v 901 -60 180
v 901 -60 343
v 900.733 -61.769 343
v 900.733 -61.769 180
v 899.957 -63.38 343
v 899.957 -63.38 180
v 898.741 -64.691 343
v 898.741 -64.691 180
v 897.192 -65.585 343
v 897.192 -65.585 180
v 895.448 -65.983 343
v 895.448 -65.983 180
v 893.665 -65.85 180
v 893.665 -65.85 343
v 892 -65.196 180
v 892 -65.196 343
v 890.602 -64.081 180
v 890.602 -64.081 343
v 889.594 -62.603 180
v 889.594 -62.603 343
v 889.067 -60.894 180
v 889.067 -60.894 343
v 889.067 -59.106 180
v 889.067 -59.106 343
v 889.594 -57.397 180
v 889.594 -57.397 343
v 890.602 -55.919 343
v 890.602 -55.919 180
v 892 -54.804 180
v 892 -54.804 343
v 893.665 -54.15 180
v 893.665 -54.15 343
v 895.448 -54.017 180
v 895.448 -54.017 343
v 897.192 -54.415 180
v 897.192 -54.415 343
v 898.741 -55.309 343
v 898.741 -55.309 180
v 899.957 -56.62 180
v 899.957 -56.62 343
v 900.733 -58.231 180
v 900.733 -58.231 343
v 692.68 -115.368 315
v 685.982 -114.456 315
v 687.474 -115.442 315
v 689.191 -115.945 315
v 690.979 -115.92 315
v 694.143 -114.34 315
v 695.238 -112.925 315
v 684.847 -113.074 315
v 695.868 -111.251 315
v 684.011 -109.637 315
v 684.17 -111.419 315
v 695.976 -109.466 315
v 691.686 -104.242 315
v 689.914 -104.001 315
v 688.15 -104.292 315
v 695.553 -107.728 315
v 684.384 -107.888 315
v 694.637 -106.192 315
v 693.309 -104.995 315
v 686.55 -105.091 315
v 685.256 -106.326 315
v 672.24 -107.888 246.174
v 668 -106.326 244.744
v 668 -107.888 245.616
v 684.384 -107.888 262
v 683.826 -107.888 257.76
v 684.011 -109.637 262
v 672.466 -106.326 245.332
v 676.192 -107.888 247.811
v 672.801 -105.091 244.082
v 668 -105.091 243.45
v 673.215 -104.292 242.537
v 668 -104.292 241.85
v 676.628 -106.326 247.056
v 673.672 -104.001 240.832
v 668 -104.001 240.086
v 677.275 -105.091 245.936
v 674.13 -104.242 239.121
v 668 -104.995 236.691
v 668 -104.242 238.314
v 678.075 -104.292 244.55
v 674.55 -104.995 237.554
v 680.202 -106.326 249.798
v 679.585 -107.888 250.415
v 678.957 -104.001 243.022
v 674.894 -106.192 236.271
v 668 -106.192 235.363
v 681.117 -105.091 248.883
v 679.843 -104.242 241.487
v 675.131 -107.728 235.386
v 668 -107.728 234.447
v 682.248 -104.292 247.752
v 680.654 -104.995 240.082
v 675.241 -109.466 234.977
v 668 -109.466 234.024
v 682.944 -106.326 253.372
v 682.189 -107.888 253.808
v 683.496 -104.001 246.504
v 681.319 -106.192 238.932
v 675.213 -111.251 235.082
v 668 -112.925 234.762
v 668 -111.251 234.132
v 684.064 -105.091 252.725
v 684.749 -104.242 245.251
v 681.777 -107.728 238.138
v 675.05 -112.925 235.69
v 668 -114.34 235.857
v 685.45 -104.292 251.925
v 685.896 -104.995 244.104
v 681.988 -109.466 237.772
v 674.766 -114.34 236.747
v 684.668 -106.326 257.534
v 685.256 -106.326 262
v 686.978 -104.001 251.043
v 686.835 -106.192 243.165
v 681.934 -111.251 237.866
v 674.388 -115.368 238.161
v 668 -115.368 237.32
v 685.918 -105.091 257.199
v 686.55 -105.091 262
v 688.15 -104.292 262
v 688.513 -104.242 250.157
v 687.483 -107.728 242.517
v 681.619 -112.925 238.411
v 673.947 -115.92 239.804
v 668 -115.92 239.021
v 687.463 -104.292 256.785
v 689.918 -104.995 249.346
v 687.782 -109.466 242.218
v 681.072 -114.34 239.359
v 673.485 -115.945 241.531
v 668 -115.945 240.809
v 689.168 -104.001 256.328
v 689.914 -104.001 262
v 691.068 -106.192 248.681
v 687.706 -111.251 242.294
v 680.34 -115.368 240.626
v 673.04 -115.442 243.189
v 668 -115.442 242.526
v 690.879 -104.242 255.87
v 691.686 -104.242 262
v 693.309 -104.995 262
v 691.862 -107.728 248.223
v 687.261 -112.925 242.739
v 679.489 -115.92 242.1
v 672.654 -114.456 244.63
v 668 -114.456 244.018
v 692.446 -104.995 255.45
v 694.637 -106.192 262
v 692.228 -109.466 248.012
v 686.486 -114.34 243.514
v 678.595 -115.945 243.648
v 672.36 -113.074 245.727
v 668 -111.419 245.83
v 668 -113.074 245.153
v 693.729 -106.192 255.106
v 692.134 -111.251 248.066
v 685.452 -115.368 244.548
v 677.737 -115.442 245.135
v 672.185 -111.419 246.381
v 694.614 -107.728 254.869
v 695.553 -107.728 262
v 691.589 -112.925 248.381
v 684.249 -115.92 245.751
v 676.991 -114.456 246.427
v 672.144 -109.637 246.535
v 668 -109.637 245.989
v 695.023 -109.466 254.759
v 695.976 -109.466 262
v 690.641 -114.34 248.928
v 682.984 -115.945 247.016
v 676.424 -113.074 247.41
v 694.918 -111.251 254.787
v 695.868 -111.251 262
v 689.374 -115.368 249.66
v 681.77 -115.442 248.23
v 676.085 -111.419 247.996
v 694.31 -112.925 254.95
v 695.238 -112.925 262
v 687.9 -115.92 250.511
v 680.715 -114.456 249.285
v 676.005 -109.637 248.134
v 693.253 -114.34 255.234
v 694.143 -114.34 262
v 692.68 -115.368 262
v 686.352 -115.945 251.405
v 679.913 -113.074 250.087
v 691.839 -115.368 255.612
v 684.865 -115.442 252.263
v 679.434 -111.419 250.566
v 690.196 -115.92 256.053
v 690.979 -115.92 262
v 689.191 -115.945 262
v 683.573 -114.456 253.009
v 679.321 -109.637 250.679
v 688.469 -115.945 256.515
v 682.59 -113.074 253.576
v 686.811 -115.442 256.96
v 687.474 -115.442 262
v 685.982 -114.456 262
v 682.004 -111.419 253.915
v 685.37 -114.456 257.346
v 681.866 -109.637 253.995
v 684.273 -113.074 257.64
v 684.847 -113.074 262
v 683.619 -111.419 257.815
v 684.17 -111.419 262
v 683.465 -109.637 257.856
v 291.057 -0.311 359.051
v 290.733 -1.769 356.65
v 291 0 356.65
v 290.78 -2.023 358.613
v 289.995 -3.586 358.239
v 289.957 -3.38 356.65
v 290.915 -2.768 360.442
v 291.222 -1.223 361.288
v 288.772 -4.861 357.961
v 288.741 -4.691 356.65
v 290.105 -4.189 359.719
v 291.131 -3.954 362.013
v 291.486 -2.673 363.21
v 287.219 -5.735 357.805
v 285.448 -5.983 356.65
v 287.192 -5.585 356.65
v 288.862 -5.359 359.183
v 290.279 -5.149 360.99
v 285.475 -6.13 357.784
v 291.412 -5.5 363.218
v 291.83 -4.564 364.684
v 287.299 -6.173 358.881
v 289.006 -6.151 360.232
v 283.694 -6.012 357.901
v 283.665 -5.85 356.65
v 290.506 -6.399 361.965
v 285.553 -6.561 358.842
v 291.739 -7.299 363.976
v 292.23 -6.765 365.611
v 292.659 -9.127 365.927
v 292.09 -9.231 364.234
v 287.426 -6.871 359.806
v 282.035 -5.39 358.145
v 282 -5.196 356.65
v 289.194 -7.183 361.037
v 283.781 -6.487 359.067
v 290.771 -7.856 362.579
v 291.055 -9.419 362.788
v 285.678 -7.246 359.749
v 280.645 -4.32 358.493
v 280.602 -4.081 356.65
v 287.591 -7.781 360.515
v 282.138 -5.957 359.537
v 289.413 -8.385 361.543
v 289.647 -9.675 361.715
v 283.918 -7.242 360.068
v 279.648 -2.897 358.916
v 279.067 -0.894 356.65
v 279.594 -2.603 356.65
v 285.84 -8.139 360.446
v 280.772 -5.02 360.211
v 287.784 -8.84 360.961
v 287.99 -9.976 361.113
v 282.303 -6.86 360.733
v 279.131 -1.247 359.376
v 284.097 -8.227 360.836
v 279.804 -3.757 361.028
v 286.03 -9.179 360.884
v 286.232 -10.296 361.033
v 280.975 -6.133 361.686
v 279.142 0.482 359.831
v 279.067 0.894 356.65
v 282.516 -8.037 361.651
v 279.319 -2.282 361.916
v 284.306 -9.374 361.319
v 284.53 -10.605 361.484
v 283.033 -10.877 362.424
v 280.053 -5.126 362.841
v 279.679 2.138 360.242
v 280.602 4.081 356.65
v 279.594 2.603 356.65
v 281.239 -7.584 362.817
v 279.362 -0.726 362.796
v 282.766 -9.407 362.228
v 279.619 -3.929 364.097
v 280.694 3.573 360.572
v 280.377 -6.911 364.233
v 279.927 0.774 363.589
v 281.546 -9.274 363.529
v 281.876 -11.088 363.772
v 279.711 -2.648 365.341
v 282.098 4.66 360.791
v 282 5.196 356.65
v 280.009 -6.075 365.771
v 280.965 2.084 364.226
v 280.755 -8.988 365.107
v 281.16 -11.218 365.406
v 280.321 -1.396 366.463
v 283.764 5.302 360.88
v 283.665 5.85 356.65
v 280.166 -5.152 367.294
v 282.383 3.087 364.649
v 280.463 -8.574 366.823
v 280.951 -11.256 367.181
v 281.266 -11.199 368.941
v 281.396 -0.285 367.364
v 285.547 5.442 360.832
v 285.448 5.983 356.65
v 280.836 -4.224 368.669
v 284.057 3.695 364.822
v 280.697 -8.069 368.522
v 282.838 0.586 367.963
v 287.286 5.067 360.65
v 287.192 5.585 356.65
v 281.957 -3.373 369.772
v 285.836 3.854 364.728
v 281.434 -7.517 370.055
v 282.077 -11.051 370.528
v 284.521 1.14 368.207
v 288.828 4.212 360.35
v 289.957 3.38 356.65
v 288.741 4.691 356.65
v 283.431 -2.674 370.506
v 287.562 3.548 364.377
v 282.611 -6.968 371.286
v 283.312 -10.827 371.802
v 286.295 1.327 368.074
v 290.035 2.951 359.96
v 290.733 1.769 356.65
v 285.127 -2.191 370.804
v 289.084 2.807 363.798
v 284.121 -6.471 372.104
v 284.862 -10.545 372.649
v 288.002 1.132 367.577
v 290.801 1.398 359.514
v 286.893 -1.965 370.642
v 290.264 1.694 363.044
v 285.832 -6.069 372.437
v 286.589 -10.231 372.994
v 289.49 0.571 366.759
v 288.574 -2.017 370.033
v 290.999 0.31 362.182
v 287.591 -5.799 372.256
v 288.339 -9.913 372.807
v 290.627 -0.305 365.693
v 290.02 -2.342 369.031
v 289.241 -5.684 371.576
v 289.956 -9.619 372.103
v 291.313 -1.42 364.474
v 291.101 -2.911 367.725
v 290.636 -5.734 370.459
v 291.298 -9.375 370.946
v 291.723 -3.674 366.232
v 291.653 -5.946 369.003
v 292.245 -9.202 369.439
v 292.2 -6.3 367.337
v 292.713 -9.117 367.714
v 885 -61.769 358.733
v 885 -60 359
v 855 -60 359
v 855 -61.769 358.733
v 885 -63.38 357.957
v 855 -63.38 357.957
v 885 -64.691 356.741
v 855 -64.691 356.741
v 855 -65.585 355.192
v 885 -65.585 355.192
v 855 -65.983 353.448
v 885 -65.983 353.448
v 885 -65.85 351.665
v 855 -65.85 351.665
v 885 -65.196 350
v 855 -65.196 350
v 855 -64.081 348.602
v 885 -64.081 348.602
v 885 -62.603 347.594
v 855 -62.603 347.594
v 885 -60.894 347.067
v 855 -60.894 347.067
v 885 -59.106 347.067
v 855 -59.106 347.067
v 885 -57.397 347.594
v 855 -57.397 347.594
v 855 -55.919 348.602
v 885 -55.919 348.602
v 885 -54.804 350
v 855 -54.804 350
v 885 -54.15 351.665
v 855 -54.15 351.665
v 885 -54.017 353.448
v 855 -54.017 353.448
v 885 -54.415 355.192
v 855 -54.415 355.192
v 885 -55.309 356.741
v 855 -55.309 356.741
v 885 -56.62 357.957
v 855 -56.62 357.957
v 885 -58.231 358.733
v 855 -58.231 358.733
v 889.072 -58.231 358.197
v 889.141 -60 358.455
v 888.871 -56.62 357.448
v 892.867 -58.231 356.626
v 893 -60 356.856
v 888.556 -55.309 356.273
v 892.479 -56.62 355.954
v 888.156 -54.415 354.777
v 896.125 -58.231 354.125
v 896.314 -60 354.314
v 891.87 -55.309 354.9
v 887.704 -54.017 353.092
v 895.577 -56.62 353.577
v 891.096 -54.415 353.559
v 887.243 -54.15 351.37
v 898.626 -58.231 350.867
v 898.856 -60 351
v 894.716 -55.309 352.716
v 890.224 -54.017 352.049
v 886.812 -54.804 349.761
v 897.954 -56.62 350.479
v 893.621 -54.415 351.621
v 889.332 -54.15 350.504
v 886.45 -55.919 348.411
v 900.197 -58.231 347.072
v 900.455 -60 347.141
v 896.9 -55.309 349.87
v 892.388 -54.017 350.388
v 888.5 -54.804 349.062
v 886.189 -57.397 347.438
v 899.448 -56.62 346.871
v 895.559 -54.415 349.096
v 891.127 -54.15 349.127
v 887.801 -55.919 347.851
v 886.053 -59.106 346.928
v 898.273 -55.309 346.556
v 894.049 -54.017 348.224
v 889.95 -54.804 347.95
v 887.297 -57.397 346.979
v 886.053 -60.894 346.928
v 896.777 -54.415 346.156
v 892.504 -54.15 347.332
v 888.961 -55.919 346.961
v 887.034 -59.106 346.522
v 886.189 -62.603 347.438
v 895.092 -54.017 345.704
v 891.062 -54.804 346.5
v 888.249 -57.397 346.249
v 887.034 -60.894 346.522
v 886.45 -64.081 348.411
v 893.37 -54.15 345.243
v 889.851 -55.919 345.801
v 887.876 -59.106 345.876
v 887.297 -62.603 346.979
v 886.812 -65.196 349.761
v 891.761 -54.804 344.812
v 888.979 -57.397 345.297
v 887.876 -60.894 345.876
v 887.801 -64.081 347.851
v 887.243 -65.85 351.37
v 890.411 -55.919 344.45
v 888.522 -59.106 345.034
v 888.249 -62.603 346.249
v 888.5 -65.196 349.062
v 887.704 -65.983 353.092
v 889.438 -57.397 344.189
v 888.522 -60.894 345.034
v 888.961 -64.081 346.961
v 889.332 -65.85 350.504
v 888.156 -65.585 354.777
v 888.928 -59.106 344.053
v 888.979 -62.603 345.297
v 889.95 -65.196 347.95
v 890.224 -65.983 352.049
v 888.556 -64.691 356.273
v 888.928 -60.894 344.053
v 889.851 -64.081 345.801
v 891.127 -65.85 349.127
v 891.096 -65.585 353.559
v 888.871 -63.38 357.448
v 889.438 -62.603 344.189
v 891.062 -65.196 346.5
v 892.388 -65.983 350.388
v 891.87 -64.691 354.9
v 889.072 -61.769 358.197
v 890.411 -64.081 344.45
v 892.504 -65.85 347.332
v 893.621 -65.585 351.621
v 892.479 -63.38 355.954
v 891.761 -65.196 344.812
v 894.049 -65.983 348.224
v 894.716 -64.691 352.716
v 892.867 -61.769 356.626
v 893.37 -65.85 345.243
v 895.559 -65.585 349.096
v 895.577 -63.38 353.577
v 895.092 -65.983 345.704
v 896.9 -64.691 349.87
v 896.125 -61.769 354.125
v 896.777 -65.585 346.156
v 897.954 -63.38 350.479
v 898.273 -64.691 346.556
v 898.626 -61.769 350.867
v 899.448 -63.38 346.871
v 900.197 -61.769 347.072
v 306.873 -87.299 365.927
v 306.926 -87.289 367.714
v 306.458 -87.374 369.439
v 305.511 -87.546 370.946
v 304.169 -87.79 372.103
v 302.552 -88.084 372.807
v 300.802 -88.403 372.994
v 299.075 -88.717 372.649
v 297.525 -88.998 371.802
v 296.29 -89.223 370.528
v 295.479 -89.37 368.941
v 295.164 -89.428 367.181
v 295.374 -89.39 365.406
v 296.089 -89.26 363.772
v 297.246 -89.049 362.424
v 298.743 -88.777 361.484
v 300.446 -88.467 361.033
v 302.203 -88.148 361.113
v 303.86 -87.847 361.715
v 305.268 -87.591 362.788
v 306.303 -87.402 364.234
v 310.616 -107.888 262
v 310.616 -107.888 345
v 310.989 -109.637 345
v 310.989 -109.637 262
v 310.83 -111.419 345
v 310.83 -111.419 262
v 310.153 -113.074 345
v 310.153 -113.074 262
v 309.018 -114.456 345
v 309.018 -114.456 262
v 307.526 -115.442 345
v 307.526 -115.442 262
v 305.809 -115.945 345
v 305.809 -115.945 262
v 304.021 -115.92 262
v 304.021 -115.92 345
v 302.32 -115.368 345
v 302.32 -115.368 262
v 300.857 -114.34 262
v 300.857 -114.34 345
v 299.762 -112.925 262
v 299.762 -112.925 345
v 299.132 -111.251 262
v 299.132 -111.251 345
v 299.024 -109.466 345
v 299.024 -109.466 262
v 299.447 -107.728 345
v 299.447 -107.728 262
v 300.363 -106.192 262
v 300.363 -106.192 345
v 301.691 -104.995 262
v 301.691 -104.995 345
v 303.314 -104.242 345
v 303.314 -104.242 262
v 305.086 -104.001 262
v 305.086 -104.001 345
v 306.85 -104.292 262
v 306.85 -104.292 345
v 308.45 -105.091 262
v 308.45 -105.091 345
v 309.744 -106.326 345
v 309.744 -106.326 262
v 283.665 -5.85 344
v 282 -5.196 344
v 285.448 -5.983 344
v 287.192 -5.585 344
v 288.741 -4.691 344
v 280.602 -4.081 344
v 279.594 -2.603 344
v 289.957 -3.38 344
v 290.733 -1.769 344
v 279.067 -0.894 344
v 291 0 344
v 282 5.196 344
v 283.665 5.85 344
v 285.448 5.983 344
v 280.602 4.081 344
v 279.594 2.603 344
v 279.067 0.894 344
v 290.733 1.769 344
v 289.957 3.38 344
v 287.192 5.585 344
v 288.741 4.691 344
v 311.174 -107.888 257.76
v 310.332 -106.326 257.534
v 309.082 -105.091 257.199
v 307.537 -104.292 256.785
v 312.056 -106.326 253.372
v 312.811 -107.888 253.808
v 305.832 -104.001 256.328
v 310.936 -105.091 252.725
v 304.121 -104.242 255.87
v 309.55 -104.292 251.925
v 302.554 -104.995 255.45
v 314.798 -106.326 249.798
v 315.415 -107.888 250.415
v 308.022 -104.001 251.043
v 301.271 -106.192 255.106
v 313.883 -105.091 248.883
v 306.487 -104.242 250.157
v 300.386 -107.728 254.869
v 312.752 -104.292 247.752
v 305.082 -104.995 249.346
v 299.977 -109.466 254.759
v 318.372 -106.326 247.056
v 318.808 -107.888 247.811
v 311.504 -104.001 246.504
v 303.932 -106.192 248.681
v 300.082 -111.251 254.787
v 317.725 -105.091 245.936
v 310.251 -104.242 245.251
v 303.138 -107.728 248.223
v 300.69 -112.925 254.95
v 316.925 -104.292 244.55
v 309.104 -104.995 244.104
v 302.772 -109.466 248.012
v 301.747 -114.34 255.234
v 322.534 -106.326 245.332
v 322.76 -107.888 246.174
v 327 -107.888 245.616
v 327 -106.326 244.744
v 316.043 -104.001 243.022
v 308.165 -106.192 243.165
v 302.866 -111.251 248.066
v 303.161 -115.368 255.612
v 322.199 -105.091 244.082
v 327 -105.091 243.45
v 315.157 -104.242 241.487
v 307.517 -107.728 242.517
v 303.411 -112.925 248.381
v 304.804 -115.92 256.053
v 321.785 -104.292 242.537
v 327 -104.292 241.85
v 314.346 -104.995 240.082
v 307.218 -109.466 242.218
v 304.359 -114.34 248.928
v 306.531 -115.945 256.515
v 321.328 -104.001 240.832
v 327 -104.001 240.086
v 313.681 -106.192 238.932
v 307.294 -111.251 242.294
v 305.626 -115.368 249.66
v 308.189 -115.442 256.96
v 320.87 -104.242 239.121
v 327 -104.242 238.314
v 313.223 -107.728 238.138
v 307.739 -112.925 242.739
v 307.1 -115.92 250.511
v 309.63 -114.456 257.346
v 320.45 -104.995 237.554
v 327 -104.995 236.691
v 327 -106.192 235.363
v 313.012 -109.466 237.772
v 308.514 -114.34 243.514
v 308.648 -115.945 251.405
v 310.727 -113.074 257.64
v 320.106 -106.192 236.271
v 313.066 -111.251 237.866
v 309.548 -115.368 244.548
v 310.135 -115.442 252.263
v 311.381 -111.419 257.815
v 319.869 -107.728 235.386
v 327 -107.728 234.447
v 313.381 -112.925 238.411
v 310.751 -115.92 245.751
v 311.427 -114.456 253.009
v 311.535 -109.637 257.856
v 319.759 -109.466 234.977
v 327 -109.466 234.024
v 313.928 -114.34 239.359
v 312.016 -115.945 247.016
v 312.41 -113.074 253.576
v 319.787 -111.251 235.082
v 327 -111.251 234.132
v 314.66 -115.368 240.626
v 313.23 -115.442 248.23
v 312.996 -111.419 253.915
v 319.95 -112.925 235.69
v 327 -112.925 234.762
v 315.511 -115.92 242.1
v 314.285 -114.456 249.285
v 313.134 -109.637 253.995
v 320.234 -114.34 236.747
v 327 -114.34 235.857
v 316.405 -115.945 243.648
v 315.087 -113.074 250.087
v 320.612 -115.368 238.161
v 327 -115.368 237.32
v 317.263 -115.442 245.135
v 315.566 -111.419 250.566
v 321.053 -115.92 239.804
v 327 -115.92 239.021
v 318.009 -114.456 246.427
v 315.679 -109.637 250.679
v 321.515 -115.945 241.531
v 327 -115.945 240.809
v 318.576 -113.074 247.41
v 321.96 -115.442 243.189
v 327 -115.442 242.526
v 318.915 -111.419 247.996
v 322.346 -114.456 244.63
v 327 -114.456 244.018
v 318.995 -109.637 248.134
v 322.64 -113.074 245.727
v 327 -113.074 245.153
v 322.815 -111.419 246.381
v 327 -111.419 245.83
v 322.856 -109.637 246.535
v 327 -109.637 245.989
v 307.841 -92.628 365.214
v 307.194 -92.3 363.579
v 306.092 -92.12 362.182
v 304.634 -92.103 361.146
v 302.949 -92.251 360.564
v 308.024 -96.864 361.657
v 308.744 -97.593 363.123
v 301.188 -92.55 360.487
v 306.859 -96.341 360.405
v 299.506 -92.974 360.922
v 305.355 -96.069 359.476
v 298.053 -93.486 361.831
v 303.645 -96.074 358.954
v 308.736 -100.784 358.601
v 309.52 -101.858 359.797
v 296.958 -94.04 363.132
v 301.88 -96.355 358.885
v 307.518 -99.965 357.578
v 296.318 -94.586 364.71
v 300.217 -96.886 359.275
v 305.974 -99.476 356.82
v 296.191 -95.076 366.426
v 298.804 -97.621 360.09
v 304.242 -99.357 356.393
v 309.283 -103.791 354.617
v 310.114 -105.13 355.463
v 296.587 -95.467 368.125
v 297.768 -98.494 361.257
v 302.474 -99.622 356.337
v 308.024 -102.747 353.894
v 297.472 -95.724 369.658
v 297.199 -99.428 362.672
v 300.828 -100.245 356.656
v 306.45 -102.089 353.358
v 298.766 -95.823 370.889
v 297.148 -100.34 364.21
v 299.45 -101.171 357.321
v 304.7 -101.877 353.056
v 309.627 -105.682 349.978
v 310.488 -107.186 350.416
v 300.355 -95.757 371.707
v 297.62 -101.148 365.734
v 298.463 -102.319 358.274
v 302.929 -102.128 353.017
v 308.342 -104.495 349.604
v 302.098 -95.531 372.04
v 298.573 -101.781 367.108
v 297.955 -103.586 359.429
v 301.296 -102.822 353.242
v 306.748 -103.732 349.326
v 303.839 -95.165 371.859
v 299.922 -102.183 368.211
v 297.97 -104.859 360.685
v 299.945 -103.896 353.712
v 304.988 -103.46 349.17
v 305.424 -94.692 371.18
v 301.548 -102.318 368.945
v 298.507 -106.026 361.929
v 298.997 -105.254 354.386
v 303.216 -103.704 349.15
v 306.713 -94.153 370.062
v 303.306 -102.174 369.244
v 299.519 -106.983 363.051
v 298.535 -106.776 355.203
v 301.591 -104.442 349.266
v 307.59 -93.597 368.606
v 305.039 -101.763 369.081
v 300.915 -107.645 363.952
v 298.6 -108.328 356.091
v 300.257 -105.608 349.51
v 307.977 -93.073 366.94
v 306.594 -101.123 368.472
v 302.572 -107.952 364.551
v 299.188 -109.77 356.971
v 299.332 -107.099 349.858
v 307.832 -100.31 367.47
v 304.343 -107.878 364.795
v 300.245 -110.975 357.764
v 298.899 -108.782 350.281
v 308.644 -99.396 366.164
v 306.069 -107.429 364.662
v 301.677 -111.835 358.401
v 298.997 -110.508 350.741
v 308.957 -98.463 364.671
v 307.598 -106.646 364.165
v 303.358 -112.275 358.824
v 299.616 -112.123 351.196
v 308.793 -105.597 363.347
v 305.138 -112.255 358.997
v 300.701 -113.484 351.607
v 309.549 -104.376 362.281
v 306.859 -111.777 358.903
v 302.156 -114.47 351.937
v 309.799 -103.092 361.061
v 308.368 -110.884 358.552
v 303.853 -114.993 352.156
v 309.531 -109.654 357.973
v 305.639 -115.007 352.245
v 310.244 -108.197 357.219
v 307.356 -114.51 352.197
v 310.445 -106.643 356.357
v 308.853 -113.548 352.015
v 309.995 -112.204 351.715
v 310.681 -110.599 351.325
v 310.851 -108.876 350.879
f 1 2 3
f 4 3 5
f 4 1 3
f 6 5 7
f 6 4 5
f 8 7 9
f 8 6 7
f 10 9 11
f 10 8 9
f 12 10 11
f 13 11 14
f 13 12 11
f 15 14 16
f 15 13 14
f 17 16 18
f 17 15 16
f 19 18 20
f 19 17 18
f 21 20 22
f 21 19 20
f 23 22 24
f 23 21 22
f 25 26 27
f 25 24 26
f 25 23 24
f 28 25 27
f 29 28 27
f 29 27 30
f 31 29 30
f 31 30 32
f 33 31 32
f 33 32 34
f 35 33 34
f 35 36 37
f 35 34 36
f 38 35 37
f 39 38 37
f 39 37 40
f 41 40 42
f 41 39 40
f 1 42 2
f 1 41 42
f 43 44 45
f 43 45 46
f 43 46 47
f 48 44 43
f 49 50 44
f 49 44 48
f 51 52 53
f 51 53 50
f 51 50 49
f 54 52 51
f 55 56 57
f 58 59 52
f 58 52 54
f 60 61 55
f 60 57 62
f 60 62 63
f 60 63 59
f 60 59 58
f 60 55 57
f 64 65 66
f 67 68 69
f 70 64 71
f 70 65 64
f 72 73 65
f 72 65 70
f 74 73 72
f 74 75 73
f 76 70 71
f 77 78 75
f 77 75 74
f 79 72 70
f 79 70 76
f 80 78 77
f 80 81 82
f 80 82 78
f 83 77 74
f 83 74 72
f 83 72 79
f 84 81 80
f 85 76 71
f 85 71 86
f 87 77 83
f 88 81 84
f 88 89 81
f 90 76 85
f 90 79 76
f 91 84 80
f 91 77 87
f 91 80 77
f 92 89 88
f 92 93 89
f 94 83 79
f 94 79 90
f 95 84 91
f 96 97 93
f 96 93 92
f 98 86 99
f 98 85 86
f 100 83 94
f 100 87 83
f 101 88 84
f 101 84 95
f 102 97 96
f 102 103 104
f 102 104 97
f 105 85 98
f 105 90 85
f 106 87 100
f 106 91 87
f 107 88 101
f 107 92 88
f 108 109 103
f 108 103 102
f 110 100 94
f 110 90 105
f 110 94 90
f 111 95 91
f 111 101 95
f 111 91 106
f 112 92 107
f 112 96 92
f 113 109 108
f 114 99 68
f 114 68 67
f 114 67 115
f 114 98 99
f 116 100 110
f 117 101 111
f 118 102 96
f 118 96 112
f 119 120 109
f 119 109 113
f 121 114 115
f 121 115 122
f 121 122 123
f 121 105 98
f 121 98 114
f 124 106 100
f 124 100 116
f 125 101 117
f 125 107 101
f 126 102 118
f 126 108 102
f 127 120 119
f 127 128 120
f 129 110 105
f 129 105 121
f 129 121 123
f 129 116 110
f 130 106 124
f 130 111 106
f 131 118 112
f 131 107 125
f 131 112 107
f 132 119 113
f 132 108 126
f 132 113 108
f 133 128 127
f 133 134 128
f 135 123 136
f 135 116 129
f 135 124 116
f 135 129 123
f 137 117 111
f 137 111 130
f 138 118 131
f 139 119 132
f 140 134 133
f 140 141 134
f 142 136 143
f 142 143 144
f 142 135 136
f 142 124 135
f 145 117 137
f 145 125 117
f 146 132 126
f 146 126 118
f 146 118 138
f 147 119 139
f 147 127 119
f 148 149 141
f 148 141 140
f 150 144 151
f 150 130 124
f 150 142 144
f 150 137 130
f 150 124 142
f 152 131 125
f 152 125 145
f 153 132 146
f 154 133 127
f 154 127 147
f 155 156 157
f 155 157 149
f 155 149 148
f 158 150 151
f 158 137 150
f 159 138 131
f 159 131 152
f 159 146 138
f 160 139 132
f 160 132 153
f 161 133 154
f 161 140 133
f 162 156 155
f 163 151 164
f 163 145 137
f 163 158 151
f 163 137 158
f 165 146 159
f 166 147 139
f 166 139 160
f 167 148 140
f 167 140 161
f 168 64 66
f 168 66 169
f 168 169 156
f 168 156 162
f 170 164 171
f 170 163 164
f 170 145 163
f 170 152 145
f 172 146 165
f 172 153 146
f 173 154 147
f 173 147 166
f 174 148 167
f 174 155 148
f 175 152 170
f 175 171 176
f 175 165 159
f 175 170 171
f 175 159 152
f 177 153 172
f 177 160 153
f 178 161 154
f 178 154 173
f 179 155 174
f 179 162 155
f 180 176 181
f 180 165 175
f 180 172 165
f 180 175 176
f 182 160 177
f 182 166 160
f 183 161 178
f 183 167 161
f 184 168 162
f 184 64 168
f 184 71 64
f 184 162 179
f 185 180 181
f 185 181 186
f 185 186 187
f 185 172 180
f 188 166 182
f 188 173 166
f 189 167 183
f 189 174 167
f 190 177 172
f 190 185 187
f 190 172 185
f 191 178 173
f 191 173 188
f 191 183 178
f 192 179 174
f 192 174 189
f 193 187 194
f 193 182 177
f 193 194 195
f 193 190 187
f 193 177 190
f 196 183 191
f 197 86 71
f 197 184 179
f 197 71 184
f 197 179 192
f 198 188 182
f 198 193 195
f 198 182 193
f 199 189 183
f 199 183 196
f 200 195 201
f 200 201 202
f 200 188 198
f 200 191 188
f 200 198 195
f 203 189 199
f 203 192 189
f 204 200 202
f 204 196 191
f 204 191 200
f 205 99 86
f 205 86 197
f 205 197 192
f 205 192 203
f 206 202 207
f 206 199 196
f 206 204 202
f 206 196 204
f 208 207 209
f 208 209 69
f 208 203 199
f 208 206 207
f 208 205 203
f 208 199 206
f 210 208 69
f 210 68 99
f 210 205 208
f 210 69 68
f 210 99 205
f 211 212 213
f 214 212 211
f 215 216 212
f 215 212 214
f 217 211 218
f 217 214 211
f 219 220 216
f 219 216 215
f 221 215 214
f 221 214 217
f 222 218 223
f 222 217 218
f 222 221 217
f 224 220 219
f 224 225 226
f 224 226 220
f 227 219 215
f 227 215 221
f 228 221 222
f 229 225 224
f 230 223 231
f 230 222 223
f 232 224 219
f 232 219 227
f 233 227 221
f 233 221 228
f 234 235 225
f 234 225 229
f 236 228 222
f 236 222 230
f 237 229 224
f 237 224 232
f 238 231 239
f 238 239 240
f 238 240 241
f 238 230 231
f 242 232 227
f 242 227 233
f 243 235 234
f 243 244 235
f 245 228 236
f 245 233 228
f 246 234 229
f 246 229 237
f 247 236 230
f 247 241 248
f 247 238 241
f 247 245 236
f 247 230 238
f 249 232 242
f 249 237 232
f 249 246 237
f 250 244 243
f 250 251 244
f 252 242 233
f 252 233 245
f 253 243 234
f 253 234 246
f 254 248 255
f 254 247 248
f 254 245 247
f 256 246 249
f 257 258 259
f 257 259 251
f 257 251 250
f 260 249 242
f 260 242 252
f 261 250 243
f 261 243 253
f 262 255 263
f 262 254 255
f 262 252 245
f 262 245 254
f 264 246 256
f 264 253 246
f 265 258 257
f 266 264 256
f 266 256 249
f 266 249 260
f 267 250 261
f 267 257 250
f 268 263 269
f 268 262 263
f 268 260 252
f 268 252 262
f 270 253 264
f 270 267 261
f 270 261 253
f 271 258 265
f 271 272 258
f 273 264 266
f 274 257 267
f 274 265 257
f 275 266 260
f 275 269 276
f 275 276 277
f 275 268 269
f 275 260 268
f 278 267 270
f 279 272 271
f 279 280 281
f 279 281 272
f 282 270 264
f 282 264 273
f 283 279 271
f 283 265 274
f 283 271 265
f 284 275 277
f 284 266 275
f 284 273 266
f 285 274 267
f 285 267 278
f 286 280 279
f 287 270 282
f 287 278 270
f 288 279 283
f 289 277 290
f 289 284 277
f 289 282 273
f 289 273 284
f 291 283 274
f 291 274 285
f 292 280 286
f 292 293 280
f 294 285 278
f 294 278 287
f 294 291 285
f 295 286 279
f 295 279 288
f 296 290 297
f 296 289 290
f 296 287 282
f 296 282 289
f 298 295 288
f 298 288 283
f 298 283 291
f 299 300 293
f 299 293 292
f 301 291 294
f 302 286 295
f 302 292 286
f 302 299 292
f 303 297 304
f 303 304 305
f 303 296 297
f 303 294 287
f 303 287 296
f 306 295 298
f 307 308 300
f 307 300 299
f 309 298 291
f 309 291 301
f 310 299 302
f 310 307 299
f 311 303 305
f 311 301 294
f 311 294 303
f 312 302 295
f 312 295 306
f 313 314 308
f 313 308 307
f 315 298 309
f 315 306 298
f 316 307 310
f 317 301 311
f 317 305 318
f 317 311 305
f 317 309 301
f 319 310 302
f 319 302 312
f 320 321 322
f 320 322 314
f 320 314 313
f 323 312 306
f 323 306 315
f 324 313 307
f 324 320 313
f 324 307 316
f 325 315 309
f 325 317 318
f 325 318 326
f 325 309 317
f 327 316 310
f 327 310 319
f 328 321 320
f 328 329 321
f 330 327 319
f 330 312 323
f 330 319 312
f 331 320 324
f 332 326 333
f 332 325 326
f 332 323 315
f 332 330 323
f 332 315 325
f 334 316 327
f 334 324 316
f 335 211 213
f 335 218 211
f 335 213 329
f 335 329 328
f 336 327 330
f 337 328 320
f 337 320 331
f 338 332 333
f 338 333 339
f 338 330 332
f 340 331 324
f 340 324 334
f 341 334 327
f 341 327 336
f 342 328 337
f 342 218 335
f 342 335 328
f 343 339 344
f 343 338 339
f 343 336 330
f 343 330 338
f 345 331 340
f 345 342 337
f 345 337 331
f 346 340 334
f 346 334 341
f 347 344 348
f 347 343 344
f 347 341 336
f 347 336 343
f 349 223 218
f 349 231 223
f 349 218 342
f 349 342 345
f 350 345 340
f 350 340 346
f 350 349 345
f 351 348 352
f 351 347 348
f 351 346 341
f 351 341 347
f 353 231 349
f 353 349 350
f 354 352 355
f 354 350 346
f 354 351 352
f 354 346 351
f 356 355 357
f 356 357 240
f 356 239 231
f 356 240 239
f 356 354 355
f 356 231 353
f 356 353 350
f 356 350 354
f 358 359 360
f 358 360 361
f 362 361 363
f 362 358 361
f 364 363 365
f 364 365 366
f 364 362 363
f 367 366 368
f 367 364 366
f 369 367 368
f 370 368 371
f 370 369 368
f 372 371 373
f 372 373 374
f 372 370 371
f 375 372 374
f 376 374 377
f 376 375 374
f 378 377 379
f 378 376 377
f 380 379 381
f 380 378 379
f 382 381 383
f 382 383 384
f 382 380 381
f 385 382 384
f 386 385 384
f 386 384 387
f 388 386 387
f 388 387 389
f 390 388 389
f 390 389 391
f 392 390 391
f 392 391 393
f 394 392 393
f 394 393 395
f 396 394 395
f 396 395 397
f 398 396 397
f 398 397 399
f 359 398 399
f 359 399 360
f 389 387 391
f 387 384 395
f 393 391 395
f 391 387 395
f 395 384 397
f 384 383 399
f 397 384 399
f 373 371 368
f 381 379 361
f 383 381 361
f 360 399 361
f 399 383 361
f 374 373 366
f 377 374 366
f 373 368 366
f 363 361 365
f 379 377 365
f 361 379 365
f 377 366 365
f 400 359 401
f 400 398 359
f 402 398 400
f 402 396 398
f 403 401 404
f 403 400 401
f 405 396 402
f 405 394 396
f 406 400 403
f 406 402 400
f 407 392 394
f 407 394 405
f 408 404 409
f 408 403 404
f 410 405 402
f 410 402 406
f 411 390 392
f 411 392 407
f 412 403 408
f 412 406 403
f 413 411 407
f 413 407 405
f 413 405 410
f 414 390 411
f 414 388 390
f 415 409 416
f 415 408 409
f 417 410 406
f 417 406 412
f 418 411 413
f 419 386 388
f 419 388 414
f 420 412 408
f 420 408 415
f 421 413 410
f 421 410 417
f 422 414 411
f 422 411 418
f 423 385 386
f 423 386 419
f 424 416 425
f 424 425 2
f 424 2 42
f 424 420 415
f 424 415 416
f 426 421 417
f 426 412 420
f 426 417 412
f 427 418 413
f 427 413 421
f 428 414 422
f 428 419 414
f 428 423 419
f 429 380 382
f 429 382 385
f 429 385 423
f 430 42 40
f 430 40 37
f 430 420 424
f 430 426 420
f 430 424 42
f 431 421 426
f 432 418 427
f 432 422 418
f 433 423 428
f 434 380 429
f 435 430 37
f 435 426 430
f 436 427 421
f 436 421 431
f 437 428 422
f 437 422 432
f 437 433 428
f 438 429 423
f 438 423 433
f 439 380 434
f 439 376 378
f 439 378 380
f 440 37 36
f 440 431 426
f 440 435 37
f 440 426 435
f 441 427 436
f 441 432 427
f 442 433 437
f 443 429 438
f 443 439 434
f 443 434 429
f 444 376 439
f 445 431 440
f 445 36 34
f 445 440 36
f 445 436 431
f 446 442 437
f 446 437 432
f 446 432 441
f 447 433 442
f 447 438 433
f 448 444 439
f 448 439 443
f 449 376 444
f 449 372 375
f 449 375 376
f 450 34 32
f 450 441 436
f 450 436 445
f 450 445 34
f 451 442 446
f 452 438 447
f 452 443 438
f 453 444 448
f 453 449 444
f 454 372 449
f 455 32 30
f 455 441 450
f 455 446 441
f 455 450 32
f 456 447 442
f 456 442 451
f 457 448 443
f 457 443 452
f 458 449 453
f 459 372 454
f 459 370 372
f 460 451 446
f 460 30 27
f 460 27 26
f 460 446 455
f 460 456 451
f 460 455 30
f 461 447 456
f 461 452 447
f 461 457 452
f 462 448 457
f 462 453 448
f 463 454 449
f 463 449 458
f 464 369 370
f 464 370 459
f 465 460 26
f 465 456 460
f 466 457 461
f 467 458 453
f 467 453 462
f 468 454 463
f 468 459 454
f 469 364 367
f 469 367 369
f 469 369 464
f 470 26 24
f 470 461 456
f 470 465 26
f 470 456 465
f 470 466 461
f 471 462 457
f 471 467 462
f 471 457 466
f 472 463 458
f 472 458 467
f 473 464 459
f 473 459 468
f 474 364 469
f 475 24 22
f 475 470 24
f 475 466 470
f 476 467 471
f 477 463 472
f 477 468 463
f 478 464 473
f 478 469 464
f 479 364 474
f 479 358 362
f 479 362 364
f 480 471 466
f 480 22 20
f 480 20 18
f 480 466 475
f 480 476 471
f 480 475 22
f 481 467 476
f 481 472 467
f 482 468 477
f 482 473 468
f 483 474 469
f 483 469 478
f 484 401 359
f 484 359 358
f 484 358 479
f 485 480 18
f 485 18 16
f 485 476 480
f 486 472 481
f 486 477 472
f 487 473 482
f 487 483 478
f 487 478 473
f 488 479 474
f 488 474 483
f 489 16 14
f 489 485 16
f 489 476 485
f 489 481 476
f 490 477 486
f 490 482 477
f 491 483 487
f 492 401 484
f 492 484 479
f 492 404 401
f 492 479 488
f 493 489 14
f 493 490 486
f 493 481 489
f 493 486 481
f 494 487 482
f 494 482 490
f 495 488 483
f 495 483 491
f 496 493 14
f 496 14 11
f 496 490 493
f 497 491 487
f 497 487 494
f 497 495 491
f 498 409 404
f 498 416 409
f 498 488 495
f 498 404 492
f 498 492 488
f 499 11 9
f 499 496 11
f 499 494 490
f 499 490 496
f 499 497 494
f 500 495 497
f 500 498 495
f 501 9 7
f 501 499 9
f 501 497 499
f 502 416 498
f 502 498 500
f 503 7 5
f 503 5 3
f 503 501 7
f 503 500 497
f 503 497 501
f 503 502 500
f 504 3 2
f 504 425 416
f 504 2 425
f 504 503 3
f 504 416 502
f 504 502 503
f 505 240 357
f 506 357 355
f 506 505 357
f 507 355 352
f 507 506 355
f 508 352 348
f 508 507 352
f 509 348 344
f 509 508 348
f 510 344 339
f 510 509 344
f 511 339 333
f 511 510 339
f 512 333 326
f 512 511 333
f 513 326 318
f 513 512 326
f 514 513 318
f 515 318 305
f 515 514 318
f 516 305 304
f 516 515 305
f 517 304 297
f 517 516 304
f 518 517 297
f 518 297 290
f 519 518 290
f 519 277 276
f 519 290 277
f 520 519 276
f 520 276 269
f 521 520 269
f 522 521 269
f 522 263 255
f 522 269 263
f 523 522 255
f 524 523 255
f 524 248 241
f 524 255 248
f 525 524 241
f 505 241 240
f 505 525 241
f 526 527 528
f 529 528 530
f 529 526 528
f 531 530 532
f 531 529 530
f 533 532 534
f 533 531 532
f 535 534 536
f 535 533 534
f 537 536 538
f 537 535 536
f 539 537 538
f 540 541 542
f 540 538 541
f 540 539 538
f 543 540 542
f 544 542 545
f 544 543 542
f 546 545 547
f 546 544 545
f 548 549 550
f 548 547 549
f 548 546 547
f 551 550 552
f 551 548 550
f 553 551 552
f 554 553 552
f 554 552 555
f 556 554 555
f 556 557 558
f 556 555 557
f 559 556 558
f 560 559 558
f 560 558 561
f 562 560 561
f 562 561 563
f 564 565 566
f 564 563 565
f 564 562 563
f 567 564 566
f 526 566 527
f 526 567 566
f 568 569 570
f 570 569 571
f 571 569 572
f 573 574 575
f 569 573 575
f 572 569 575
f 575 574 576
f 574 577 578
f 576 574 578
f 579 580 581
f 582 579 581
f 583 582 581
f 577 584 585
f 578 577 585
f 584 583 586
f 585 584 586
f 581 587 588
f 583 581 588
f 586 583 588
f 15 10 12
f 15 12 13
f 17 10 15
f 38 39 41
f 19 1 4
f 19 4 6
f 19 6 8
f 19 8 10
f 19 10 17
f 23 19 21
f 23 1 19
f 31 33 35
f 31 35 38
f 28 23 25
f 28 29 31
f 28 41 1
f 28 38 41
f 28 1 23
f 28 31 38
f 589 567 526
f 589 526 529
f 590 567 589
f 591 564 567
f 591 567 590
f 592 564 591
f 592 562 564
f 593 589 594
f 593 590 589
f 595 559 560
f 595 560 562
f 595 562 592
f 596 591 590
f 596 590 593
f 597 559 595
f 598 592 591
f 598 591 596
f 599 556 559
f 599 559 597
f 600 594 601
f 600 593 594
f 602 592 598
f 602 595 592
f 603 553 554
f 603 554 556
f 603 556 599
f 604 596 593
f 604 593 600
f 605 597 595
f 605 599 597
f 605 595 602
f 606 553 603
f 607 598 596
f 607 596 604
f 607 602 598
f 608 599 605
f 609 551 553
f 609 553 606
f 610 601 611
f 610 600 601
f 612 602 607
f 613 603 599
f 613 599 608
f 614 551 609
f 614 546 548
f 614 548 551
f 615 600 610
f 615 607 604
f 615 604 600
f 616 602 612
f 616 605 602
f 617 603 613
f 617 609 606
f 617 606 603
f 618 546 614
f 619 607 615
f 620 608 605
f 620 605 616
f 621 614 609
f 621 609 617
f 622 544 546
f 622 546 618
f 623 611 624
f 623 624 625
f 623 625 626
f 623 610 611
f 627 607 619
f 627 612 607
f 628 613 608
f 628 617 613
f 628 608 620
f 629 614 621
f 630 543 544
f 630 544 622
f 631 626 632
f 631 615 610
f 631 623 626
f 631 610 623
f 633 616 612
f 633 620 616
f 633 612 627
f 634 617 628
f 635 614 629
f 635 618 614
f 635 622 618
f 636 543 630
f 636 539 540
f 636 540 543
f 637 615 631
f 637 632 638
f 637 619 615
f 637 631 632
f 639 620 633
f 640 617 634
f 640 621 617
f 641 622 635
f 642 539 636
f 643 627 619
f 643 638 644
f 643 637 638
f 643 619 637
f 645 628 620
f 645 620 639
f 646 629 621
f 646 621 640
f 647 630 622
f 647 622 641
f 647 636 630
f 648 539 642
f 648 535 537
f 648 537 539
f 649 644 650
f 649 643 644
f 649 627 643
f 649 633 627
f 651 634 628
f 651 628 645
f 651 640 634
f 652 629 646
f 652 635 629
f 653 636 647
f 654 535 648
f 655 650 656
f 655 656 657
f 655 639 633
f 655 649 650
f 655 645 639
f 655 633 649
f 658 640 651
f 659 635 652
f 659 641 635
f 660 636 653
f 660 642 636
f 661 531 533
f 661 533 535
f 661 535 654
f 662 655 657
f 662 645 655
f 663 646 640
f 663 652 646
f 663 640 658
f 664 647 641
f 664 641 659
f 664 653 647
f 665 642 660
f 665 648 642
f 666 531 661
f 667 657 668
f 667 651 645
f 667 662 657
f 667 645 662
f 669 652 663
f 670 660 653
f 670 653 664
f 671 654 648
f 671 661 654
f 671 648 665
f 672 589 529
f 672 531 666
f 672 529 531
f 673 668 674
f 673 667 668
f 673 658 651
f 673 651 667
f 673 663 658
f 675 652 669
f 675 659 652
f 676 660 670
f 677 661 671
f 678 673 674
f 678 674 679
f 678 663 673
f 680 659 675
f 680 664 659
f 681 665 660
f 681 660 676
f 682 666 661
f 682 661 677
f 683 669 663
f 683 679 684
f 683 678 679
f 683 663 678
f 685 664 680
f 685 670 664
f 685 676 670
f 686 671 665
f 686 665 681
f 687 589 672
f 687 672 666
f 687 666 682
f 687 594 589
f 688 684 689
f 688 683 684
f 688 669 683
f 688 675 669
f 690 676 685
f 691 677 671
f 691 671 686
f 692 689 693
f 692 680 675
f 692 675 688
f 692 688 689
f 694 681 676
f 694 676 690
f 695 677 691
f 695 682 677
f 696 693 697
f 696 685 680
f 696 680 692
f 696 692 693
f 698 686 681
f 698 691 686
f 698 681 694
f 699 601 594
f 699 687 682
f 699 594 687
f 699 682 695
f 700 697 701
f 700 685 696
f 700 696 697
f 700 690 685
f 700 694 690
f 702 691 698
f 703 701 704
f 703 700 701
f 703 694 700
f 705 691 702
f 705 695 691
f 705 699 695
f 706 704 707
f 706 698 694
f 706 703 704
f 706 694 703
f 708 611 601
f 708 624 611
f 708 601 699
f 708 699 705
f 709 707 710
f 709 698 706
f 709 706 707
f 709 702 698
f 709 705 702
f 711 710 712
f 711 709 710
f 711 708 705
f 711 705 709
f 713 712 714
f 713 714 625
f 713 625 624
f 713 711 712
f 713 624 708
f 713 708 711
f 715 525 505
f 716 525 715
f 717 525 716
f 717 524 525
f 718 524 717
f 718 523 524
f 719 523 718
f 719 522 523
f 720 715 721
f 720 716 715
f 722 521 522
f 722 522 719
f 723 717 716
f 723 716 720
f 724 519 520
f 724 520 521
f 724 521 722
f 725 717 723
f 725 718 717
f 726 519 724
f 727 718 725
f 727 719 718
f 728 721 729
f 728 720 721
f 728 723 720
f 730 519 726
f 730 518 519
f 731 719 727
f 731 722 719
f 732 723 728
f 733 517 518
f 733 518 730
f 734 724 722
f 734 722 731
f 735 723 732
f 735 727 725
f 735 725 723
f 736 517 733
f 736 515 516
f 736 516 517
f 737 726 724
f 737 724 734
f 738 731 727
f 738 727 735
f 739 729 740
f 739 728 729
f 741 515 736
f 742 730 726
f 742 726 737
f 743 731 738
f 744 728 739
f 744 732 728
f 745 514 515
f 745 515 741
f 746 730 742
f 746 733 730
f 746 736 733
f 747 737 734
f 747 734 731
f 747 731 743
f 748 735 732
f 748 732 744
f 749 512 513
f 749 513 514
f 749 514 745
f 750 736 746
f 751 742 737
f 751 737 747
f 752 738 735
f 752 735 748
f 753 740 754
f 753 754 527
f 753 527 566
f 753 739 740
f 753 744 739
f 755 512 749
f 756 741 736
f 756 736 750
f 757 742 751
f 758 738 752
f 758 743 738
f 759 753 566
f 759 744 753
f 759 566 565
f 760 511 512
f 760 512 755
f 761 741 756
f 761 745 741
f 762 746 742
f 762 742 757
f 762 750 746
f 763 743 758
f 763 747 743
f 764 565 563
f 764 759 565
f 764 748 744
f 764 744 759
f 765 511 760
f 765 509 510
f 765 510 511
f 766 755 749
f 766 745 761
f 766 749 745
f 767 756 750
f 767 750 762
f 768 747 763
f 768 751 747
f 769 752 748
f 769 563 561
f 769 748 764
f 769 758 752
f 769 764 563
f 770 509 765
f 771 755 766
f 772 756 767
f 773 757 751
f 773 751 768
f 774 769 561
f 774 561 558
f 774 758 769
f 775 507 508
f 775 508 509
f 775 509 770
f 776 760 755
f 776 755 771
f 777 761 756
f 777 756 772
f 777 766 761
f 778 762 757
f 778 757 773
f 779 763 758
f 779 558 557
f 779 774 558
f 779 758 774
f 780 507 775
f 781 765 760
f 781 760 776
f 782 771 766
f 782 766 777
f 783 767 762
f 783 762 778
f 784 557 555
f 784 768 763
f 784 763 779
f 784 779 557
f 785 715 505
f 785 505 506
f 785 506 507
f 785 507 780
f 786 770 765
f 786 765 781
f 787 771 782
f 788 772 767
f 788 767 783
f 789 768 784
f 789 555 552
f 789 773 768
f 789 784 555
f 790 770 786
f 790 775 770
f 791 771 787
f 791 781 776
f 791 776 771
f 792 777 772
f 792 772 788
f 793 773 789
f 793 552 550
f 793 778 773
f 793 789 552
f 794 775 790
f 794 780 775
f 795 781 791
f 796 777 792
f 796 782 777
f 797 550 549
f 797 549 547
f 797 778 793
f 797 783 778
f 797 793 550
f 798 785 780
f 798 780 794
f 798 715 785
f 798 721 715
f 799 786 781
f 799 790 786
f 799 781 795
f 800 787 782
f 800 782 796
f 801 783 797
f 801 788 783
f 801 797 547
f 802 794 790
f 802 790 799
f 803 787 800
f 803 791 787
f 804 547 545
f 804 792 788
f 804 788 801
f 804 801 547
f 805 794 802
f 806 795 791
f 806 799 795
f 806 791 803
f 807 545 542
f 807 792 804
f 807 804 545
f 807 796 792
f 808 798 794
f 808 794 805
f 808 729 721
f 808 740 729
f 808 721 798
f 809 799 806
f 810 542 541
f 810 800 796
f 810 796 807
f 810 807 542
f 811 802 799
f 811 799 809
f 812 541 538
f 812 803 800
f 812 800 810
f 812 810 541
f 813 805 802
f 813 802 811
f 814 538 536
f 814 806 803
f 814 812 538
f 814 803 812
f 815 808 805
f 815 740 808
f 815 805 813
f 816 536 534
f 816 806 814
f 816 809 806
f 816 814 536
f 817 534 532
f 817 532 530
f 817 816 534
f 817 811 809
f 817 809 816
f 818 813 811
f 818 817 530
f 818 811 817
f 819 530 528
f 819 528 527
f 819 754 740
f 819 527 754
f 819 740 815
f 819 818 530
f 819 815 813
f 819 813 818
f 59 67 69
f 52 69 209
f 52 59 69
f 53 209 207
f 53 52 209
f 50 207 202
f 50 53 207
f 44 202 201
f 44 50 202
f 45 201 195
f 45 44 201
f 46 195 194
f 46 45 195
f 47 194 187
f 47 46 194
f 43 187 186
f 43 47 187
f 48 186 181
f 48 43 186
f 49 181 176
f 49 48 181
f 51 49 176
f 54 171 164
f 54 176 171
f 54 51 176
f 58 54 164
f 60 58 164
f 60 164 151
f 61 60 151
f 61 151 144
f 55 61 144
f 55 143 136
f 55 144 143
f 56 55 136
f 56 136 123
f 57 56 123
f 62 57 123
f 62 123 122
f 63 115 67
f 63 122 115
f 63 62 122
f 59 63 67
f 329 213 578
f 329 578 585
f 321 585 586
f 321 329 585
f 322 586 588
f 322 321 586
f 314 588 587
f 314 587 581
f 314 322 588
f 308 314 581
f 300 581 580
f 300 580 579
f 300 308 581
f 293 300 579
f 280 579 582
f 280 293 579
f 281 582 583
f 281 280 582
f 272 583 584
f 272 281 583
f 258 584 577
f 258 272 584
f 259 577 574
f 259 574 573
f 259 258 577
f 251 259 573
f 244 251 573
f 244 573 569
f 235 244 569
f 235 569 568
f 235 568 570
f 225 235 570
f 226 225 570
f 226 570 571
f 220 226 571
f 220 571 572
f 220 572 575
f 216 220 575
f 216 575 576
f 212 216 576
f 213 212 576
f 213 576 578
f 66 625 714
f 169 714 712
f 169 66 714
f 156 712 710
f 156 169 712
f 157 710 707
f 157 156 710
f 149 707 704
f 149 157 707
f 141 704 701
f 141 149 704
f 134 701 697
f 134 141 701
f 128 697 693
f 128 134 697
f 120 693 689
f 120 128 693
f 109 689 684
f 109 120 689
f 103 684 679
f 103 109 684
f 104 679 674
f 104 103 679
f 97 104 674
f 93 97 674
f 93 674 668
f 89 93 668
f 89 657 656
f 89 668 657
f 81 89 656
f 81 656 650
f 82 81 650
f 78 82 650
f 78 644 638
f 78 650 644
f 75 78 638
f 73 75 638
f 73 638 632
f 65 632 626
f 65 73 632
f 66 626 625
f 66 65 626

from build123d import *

# Parameters (mm, degrees)
PIPE_1_PROFILE_R = 6
PIPE_2_PROFILE_R = 6


with BuildPart() as part:
    # Pipe 1: sweep along a curve in space
    with BuildLine() as pipe_1_path:
        Line((285, 0, 344), (285, 0, 356.65))
        ThreePointArc((285, 0, 356.65), (285.542281334, -2.982547337, 363.968555185), (286.851464285, -10.18305357, 367))
        Line((286.851464285, -10.18305357, 367), (301.06452036, -88.354861978, 367))
        ThreePointArc((301.06452036, -88.354861978, 367), (303.847324701, -103.660285853, 360.556349186), (305, -110, 345))
        Line((305, -110, 345), (305, -110, 262))
        ThreePointArc((305, -110, 262), (311.443650814, -110, 246.443650814), (327, -110, 240))
        Line((327, -110, 240), (668, -110, 240))
        ThreePointArc((668, -110, 240), (683.556349186, -110, 246.443650814), (690, -110, 262))
        Line((690, -110, 262), (690, -110, 315))
    # Pipe 1 profile (on start of the path) → Pipe 1 (sweep)
    with BuildSketch(Plane(origin=(285, 0, 344), x_dir=(1, 0, 0), z_dir=(0, 0, 1))):
        Circle(PIPE_1_PROFILE_R)
    sweep(path=pipe_1_path.line)


with BuildPart() as body_2:
    # Pipe 2: sweep along a curve in space
    with BuildLine() as pipe_2_path:
        Line((855, -60, 353), (885, -60, 353))
        ThreePointArc((885, -60, 353), (892.071067812, -60, 350.071067812), (895, -60, 343))
        Line((895, -60, 343), (895, -60, 180))
    # Pipe 2 profile (on start of the path) → Pipe 2 (sweep)
    with BuildSketch(Plane(origin=(855, -60, 353), x_dir=(0, 0, 1), z_dir=(1, 0, 0))):
        Circle(PIPE_2_PROFILE_R)
    sweep(path=pipe_2_path.line)


solid = Compound([part.part, body_2.part])
